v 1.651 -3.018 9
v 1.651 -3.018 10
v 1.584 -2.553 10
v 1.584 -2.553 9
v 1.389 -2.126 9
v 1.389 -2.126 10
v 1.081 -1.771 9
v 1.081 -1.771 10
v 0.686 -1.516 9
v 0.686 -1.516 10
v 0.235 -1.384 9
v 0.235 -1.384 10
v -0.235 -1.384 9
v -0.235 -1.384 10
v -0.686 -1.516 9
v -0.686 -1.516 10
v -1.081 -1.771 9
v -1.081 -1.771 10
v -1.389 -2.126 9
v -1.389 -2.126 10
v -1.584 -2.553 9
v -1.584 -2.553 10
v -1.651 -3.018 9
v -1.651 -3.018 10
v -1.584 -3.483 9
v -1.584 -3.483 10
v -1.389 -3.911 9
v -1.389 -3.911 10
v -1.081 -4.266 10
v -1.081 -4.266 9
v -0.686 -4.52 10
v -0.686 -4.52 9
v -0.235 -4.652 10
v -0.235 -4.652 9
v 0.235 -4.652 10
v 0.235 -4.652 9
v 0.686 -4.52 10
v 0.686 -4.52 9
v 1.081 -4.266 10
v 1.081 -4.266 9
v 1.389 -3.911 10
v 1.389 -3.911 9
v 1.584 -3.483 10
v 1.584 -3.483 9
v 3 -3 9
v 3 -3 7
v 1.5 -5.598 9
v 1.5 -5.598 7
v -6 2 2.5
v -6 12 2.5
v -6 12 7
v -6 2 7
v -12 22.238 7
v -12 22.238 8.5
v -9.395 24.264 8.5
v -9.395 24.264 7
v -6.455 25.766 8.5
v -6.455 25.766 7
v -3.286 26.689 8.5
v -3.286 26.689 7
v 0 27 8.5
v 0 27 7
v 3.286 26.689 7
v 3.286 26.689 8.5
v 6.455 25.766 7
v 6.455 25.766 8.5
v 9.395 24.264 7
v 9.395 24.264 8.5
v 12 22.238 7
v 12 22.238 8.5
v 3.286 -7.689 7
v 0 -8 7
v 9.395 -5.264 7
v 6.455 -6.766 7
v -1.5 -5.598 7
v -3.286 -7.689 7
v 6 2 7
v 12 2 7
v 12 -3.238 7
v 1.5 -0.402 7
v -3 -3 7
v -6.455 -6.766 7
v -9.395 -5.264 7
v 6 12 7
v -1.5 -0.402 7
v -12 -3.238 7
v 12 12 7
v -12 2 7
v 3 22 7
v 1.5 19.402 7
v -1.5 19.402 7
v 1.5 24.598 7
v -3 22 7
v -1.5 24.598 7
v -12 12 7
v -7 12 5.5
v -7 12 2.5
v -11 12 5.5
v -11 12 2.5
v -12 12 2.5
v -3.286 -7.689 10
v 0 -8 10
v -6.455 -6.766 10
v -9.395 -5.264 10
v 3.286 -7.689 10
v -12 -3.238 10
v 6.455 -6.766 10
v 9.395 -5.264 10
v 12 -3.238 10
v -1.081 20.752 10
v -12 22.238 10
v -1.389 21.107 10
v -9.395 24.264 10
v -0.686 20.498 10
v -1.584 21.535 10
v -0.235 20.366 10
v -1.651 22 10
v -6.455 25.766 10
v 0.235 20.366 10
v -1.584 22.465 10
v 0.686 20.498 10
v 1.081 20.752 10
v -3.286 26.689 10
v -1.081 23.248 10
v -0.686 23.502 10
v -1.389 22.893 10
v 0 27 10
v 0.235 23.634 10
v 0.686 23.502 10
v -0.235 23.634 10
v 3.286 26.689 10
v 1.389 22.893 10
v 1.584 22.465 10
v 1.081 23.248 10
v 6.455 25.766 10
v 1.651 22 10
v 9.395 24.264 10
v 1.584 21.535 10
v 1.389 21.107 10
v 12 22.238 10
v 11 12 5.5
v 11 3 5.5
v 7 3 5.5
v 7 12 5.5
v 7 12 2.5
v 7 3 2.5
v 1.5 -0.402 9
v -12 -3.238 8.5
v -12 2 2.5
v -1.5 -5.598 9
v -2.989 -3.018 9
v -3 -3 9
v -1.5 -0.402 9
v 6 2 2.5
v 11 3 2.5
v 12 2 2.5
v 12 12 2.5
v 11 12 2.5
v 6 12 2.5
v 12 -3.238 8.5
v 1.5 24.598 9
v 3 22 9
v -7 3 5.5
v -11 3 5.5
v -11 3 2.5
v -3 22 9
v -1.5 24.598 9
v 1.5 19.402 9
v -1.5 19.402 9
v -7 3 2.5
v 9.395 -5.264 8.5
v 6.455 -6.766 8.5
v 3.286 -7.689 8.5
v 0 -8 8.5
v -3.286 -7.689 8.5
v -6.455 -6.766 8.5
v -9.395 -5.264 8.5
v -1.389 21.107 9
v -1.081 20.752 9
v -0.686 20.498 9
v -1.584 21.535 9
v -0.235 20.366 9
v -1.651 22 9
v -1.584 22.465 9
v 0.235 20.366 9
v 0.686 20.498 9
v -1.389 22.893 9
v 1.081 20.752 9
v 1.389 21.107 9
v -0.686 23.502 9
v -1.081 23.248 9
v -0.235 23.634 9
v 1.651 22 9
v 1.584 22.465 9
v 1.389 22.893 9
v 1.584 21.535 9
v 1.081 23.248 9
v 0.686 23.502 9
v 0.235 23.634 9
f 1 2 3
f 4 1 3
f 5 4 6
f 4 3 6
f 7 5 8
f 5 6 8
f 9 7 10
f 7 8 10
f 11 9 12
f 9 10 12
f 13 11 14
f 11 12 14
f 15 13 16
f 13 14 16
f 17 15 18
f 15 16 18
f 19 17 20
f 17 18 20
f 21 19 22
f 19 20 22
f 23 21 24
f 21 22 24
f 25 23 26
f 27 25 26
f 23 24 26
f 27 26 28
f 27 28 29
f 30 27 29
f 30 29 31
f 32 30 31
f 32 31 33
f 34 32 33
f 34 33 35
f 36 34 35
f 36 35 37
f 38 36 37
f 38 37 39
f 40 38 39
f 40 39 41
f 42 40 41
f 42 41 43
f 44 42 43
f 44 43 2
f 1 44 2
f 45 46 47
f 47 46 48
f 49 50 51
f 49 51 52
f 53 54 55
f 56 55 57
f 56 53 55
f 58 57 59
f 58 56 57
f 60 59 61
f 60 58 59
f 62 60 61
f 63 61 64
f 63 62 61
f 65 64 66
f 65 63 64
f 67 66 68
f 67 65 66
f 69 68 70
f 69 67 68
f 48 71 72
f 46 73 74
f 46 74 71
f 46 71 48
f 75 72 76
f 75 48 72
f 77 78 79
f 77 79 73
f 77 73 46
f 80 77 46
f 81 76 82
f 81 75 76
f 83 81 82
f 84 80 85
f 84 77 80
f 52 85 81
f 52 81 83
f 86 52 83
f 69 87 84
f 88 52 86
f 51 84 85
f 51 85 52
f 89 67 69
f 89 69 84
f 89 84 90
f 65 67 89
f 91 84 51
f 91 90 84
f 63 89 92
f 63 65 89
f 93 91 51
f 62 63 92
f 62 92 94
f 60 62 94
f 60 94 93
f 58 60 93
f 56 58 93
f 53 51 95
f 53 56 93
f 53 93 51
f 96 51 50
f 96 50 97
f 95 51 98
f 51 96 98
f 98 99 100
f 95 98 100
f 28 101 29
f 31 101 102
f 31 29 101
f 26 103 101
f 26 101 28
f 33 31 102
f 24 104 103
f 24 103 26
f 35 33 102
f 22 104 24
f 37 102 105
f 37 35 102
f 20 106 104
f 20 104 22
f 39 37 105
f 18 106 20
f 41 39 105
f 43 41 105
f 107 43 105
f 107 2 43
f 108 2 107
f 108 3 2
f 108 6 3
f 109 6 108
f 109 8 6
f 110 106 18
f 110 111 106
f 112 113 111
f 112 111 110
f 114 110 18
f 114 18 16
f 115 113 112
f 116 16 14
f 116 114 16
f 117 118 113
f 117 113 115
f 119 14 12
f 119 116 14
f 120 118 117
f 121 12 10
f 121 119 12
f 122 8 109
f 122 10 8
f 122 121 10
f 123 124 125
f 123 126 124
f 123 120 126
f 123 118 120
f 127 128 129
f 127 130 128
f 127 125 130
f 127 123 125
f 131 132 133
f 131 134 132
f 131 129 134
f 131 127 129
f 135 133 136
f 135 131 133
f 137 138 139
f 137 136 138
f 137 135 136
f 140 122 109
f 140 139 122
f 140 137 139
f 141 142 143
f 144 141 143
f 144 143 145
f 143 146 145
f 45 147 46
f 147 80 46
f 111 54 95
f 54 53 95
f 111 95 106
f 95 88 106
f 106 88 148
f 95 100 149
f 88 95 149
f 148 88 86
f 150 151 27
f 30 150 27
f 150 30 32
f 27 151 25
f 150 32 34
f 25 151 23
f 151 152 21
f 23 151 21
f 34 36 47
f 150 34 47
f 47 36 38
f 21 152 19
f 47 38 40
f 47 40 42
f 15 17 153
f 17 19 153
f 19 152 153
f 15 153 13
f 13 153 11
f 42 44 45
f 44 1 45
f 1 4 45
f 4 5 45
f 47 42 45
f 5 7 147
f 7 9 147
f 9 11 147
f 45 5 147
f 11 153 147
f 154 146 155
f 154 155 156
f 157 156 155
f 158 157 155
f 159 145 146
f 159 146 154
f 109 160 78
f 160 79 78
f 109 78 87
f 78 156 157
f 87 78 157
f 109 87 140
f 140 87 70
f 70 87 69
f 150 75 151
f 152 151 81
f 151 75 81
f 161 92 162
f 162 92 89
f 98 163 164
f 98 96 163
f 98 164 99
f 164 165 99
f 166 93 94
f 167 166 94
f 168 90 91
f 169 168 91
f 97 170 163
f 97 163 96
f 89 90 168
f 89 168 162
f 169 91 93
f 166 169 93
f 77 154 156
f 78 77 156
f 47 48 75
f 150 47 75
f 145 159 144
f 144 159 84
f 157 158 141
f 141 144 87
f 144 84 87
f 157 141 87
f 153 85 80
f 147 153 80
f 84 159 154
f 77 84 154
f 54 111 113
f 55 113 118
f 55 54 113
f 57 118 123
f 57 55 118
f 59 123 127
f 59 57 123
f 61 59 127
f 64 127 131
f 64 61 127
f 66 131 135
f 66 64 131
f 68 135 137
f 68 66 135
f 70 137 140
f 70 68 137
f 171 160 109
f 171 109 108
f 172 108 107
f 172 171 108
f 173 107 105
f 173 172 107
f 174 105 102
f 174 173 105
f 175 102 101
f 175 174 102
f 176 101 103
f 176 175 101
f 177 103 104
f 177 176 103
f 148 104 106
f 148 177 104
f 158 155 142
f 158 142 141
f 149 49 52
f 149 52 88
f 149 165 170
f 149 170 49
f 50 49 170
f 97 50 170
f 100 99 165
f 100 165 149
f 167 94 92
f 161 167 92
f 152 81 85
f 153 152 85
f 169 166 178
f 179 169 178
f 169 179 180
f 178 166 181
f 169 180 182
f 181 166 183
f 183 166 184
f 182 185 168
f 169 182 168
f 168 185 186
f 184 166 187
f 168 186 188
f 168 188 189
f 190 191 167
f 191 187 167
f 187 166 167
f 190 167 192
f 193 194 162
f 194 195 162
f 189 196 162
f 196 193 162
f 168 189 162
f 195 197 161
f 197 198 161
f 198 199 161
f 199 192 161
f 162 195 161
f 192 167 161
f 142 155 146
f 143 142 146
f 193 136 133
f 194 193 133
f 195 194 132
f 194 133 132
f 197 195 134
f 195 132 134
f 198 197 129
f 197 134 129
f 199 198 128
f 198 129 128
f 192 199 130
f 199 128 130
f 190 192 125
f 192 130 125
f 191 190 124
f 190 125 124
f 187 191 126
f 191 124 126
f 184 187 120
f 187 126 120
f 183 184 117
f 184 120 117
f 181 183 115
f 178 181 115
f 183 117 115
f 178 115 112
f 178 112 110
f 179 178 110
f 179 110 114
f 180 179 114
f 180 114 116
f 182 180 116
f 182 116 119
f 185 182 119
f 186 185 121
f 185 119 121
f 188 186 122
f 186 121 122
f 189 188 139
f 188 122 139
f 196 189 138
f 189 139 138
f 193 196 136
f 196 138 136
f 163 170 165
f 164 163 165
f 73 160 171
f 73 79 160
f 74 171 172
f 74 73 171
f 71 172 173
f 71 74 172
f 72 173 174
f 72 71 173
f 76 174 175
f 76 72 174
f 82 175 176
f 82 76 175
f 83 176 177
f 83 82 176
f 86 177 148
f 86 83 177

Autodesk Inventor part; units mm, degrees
ref_plane "YZ Plane" through (0, 0, 0) normal (1, 0, 0) x (0, 1, 0)
ref_plane "XZ Plane" through (0, 0, 0) normal (0, 1, 0) x (-1, 0, 0)
ref_plane "XY Plane" through (0, 0, 0) normal (0, 0, 1) x (1, 0, 0)
sketch "Sketch1" plane through (0, 0, 0) normal (0, 0, 1) x (1, 0, 0)
  line L0 (0, 0) -> (4, 0)
  line L1 (4, 0) -> (4, 13)
  line L2 (4, 13) -> (0, 13)
  line L3 (0, 13) -> (0, 0)
  line L4 (4, 13) -> (-4, 13)
  line L5 (-4, 13) -> (-4, -8)
  line L6 (-4, -8) -> (4, -8)
  line L7 (4, -8) -> (4, 13)
  line L8 (-4, 13) -> (4, 13)
  line L9 (4, 13) -> (4, 21)
  line L10 (4, 21) -> (-4, 21)
  line L11 (-4, 21) -> (-4, 13)
  line L12 (4, 21) -> (7, 21)
  line L13 (7, 21) -> (7, 13)
  line L14 (7, 13) -> (4, 13)
  line L15 (4, 13) -> (4, 21)
  line L16 (7, 21) -> (11, 21)
  line L17 (11, 21) -> (11, 13)
  line L18 (11, 13) -> (7, 13)
  line L19 (7, 13) -> (7, 21)
  line L20 (11, 13) -> (4, 13)
  line L21 (4, 13) -> (4, -8)
  line L22 (4, -8) -> (11, -8)
  line L23 (4, -8) -> (11, -8)
  line L24 (11, -8) -> (11, 0)
  line L25 (11, 0) -> (4, 0)
  line L26 (4, 0) -> (4, -8)
  line L27 (11, -8) -> (14, -8)
  line L28 (14, -8) -> (14, 0)
  line L29 (14, 0) -> (11, 0)
  line L30 (11, 0) -> (11, -8)
  line L31 (14, -8) -> (19, -8)
  line L32 (19, -8) -> (19, 13)
  line L33 (19, 13) -> (14, 13)
  line L34 (14, 13) -> (14, -8)
  line L35 (14, 13) -> (22, 13)
  line L36 (14, 18) -> (14, 13)
  line L37 (19, 13) -> (14, 13)
  line L38 (14, 13) -> (14, 21)
  line L39 (14, 21) -> (19, 21)
  line L40 (19, 21) -> (19, 13)
  line L41 (19, -8) -> (-19, -8)
  line L42 (-19, -8) -> (-19, 0)
  line L43 (-19, 0) -> (19, 0)
  line L44 (19, 0) -> (19, -8)
  line L45 (-4, 0) -> (-7, 0)
  line L46 (-7, 0) -> (-7, -8)
  line L47 (-7, -8) -> (-4, -8)
  line L48 (-4, -8) -> (-4, 0)
  line L49 (-7, 0) -> (-11, 0)
  line L50 (-11, 0) -> (-11, -8)
  line L51 (-11, -8) -> (-7, -8)
  line L52 (-7, -8) -> (-7, 0)
  line L53 (-11, -8) -> (-14, -8)
  line L54 (-14, -8) -> (-14, 0)
  line L55 (-14, 0) -> (-11, 0)
  line L56 (-11, 0) -> (-11, -8)
  line L57 (7, 13) -> (11, 13)
  line L58 (11, 13) -> (11, 3)
  line L59 (11, 3) -> (7, 3)
  line L60 (7, 3) -> (7, 13)
  line L61 (-4, 13) -> (-7, 13)
  line L62 (-7, 13) -> (-7, 21)
  line L63 (-7, 21) -> (-4, 21)
  line L64 (-4, 21) -> (-4, 13)
  line L65 (-7, 21) -> (-11, 21)
  line L66 (-11, 21) -> (-11, 13)
  line L67 (-11, 13) -> (-7, 13)
  line L68 (-7, 13) -> (-7, 21)
  line L69 (-7, 13) -> (-11, 13)
  line L70 (-11, 13) -> (-11, 3)
  line L71 (-11, 3) -> (-7, 3)
  line L72 (-7, 3) -> (-7, 13)
  line L73 (-19, -8) -> (-14, -8)
  line L74 (-14, -8) -> (-14, 13)
  line L75 (-14, 13) -> (-19, 13)
  line L76 (-19, 13) -> (-19, -8)
  dimension "d0" = 4
  dimension "d1" = 13
  dimension "d2" = 8
  dimension "d3" = 21
  dimension "d4" = 8
  dimension "d5" = 8
  dimension "d6" = 3
  dimension "d7" = 8
  dimension "d8" = 4
  dimension "d9" = 8
  dimension "d10" = 3
  dimension "d11" = 8
  dimension "d12" = 5
  dimension "d13" = 21
  dimension "d16" = 5
  dimension "d17" = 8
  dimension "d18" = 38
  dimension "d19" = 8
  dimension "d20" = 3
  dimension "d21" = 8
  dimension "d22" = 4
  dimension "d23" = 8
  dimension "d24" = 3
  dimension "d25" = 8
  dimension "d26" = 10
  dimension "d27" = 3
  dimension "d28" = 8
  dimension "d29" = 4
  dimension "d30" = 8
  dimension "d31" = 4
  dimension "d32" = 10
  dimension "d33" = 5
  dimension "d34" = 21
extrude "Extrusion1" add sketch "Sketch1" along normal blind 2.5 contours L3 L2 L1 L0 | L43 L5 L4 L3 | L0 L7 L6 L5 L43 | L25 L24 L22 L7 | L4 L11 L10 L9 L2 | L5 L41 L46 L43 | L9 L12 L13 L14 | L29 L28 L27 L24 | L61 L62 L63 L11 | L46 L41 L50 L43 | L13 L16 L17 L18 | L18 L58 L59 L60 | L43 L32 L31 L28 | L34 L33 L32 L43 | L67 L66 L65 L62 | L72 L71 L70 L67 | L50 L41 L54 L43 | L54 L41 L42 L43 | L43 L76 L75 L74
sketch "Sketch2" plane through (0, 0, 2.5) normal (0, 0, 1) x (1, 0, 0)
  line L0 (-14, 13) -> (-19, 13) projected
  line L1 (-19, 13) -> (-14, 13)
  line L2 (-14, 13) -> (-14, 8)
  line L3 (-14, 8) -> (-19, 8)
  line L4 (-19, 8) -> (-19, 13)
  line L5 (14, 13) -> (19, 13)
  line L6 (19, 13) -> (19, 8)
  line L7 (19, 8) -> (14, 8)
  line L8 (14, 8) -> (14, 13)
  line L9 (-20.5, 6.5) -> (-12.5, 6.5)
  line L10 (-12.5, 6.5) -> (-12.5, 14.5)
  line L11 (-12.5, 14.5) -> (-20.5, 14.5)
  line L12 (-20.5, 14.5) -> (-20.5, 6.5)
  line L13 (12.5, 6.5) -> (20.5, 6.5)
  line L14 (20.5, 6.5) -> (20.5, 14.5)
  line L15 (20.5, 14.5) -> (12.5, 14.5)
  line L16 (12.5, 14.5) -> (12.5, 6.5)
  line L17 (-20.5, 14.5) -> (-19, 14.5)
  line L18 (-19, 14.5) -> (-19, 4.5)
  line L19 (-19, 4.5) -> (-20.5, 4.5)
  line L20 (-20.5, 4.5) -> (-20.5, 14.5)
  line L21 (-14, 0) -> (-14, 13) projected
  line L22 (-12.5, 14.5) -> (-14, 14.5)
  line L23 (-14, 14.5) -> (-14, 4.5)
  line L24 (-14, 4.5) -> (-12.5, 4.5)
  line L25 (-12.5, 4.5) -> (-12.5, 14.5)
  line L26 (-19, 14.5) -> (-14, 14.5)
  line L27 (-14, 14.5) -> (-14, 13)
  line L28 (-14, 13) -> (-19, 13)
  line L29 (-19, 13) -> (-19, 14.5)
  line L30 (12.5, 14.5) -> (20.5, 14.5)
  line L31 (20.5, 14.5) -> (20.5, 13)
  line L32 (20.5, 13) -> (12.5, 13)
  line L33 (12.5, 13) -> (12.5, 14.5)
  line L34 (14, 13) -> (14, 0) projected
  line L35 (12.5, 14.5) -> (14, 14.5)
  line L36 (14, 14.5) -> (14, 4.5)
  line L37 (14, 4.5) -> (12.5, 4.5)
  line L38 (12.5, 4.5) -> (12.5, 14.5)
  line L39 (19, -8) -> (19, 13) projected
  line L40 (20.5, 14.5) -> (19, 14.5)
  line L41 (19, 14.5) -> (19, 4.5)
  line L42 (19, 4.5) -> (20.5, 4.5)
  line L43 (20.5, 4.5) -> (20.5, 14.5)
  point P0 (0, 0)
  dimension "d37" = 5
  dimension "d38" = 5
  dimension "d39" = 5
  dimension "d40" = 5
  dimension "d41" = 1.5
  dimension "d42" = 1.5
  dimension "d43" = 1.5
  dimension "d44" = 10
  dimension "d45" = 10
  dimension "d46" = 10
extrude "Extrusion2" add sketch "Sketch2" along normal blind 3 contours L23 L11 L10 L9 L21 L2 | L0 L18 L11 L23 | L4 L18 L9 L12 L11 | L9 L25 L24 L21 | L18 L19 L20 L9 | L36 L15 L41 L5 | L8 L34 L13 L16 L32 | L32 L16 L15 L36 | L32 L14 L13 L39 L6 | L41 L15 L14 L32 | L34 L37 L38 L13 | L13 L43 L42 L39
sketch "Sketch4" plane through (0, 0, 5.5) normal (0, 0, 1) x (1, 0, 0)
  line L0 (-12.5, 14.5) -> (-20.5, 14.5) projected
  line L1 (-12.5, 4.5) -> (-12.5, 14.5) projected
  line L2 (-20.5, 14.5) -> (-12.5, 14.5)
  line L3 (-12.5, 14.5) -> (-12.5, 4.5)
  line L4 (-12.5, 4.5) -> (-20.5, 4.5)
  line L5 (-20.5, 4.5) -> (-20.5, 14.5)
  line L6 (12.5, 14.5) -> (12.5, 4.5) projected
  line L7 (20.5, 4.5) -> (20.5, 14.5) projected
  line L8 (12.5, 14.5) -> (20.5, 14.5)
  line L9 (20.5, 14.5) -> (20.5, 4.5)
  line L10 (20.5, 4.5) -> (12.5, 4.5)
  line L11 (12.5, 4.5) -> (12.5, 14.5)
  point P0 (0, 0)
extrude "Extrusion3" add sketch "Sketch4" along normal blind 1.5
sketch "Sketch5" plane through (0, 0, 7) normal (0, 0, 1) x (1, 0, 0)
  line L0 (-12.5, 14.5) -> (-20.5, 14.5) projected
  line L1 (20.5, 4.5) -> (20.5, 14.5) projected
  line L2 (-20.5, 14.5) -> (20.5, 14.5)
  line L3 (20.5, 14.5) -> (20.5, 4.5)
  line L4 (20.5, 4.5) -> (-20.5, 4.5)
  line L5 (-20.5, 4.5) -> (-20.5, 14.5)
  line L6 (-20.5, 14.5) -> (-20.5, 4.5) projected
  line L7 (-20.5, 9.5) -> (20.5, 9.5)
  line L8 (0, 9.5) -> (0, 14.5)
  circle A0 centre (0, 9.5) radius 17.5
  point P0 (0, 0)
extrude "Extrusion4" add sketch "Sketch5" along normal blind 1.5
sketch "Sketch6" plane through (0, 0, 8.5) normal (0, 0, 1) x (1, 0, 0)
  arc A0 (16.7705, 14.5) -> (-16.7705, 14.5) centre (0, 9.5) ccw projected
  circle A1 centre (0, 9.5) radius 17.5
  circle A2 centre (0, 9.5) radius 7.5
  circle A3 centre (0, 9.5) radius 12.5
  line L0 (12.5, 14.5) -> (12.5, 4.5) projected
  circle A4 centre (0, 9.5) radius 10
  circle A5 centre (0, -0.5) radius 1.651
  circle A6 centre (0, 2) radius 1.651
  circle A7 centre (7.5, 9.5) radius 1.651
  circle A8 centre (-7.5, 9.5) radius 1.651
  circle A9 centre (0, 17) radius 1.651
  circle A10 centre (0, 22) radius 1.651
  circle A11 centre (0, -3) radius 1.651
  point P0 (0, 0)
  dimension "d54" = 20
  dimension "d53" = 15
  dimension "d55" = 3.302
  dimension "d56" = 3.302
  dimension "d57" = 3.302
  dimension "d58" = 3.302
  dimension "d59" = 3.302
  dimension "d62" = 3.302
  dimension "d63" = 3.302
extrude "Extrusion5" cut sketch "Sketch6" against normal blind 2.5 contours A2 A7 | A2 A7 | A8 A2 | A2 A8 | A11 A5 | A5 A11 A3 | A3 A11 | A10 A3 | A3 A10
sketch "Sketch7" plane through (0, 0, 2.5) normal (0, 0, -1) x (-1, 0, 0)
  line L0 (-36.0395, -19.2499) -> (42.4279, -19.2499)
  line L1 (42.4279, -19.2499) -> (42.4279, 35.743)
  line L2 (42.4279, 35.743) -> (-36.0395, 35.743)
  line L3 (-36.0395, 35.743) -> (-36.0395, -19.2499)
  point P0 (0, 0)
extrude "Extrusion6" cut sketch "Sketch7" along normal blind 2.5
sketch "Sketch8" plane through (0, 0, 2.5) normal (0, 0, -1) x (-1, 0, 0)
  line L0 (-12.5, 14.5) -> (-12.5, 4.5) projected
  line L1 (-12.5, 14.5) -> (-13, 14.5)
  line L2 (-13, 14.5) -> (-13, 4.5)
  line L3 (-13, 4.5) -> (-12.5, 4.5)
  line L4 (-12.5, 4.5) -> (-12.5, 14.5)
  line L5 (12.5, 4.5) -> (12.5, 14.5) projected
  line L6 (12.5, 14.5) -> (13, 14.5)
  line L7 (13, 14.5) -> (13, 4.5)
  line L8 (13, 4.5) -> (12.5, 4.5)
  line L9 (12.5, 4.5) -> (12.5, 14.5)
  point P0 (0, 0)
  dimension "d66" = 0.5
  dimension "d67" = 10
  dimension "d68" = 0.5
  dimension "d69" = 10
extrude "Extrusion7" cut sketch "Sketch8" against normal blind 4.5
sketch "Sketch10" plane through (0, 0, 2.5) normal (0, 0, -1) x (-1, 0, 0)
  line L0 (19, 13) -> (19, 4.5) projected
  line L1 (19, 13) -> (14, 13)
  line L2 (14, 13) -> (14, -8)
  line L3 (14, -8) -> (19, -8)
  line L4 (19, -8) -> (19, 13)
  line L5 (14, -8) -> (11, -8)
  line L6 (11, -8) -> (11, 0)
  line L7 (11, 0) -> (14, 0)
  line L8 (14, 0) -> (14, -8)
  line L9 (11, -8) -> (7, -8)
  line L10 (7, -8) -> (7, 0)
  line L11 (7, 0) -> (11, 0)
  line L12 (11, 0) -> (11, -8)
  line L13 (7, -8) -> (4, -8)
  line L14 (4, -8) -> (4, 0)
  line L15 (4, 0) -> (7, 0)
  line L16 (7, 0) -> (7, -8)
  line L17 (4, -8) -> (0, -8)
  line L18 (0, -8) -> (0, 0)
  line L19 (0, 0) -> (4, 0)
  line L20 (4, 0) -> (4, -8)
  line L21 (0, 0) -> (-4, 0)
  line L22 (-4, 0) -> (-4, -8)
  line L23 (-4, -8) -> (0, -8)
  line L24 (0, -8) -> (0, 0)
  line L25 (-4, -8) -> (-7, -8)
  line L26 (-7, -8) -> (-7, 0)
  line L27 (-7, 0) -> (-4, 0)
  line L28 (-4, 0) -> (-4, -8)
  line L29 (-7, -8) -> (-11, -8)
  line L30 (-11, -8) -> (-11, 0)
  line L31 (-11, 0) -> (-7, 0)
  line L32 (-7, 0) -> (-7, -8)
  line L33 (-11, -8) -> (-14, -8)
  line L34 (-14, -8) -> (-14, 0)
  line L35 (-14, 0) -> (-11, 0)
  line L36 (-11, 0) -> (-11, -8)
  line L37 (-14, -8) -> (-19, -8)
  line L38 (-19, -8) -> (-19, 13)
  line L39 (-19, 13) -> (-14, 13)
  line L40 (-14, 13) -> (-14, -8)
  line L41 (4, -8) -> (-4, -8)
  line L42 (-4, -8) -> (-4, 21)
  line L43 (-4, 21) -> (4, 21)
  line L44 (4, 21) -> (4, -8)
  line L45 (4, 21) -> (7, 21)
  line L46 (7, 21) -> (7, 13)
  line L47 (7, 13) -> (4, 13)
  line L48 (4, 13) -> (4, 21)
  line L49 (-4, 21) -> (-7, 21)
  line L50 (-7, 21) -> (-7, 13)
  line L51 (-7, 13) -> (-4, 13)
  line L52 (-4, 13) -> (-4, 21)
  line L53 (4, 0) -> (14, 0)
  line L54 (14, 0) -> (14, 3)
  line L55 (14, 3) -> (4, 3)
  line L56 (4, 3) -> (4, 0)
  line L57 (7, 13) -> (4, 13)
  line L58 (4, 13) -> (4, 3)
  line L59 (4, 3) -> (7, 3)
  line L60 (7, 3) -> (7, 13)
  line L61 (7, 3) -> (12, 3)
  line L62 (12, 3) -> (12, 13)
  line L63 (12, 13) -> (7, 13)
  line L64 (7, 13) -> (7, 3)
  line L65 (12, 13) -> (7, 13)
  line L66 (7, 13) -> (7, 21)
  line L67 (7, 21) -> (12, 21)
  line L68 (12, 21) -> (12, 13)
  line L69 (7, 3) -> (11, 3)
  line L70 (11, 3) -> (11, 21)
  line L71 (11, 21) -> (7, 21)
  line L72 (7, 21) -> (7, 3)
  line L73 (-7, 21) -> (-11, 21)
  line L74 (-11, 21) -> (-11, 8)
  line L75 (-11, 8) -> (-7, 8)
  line L76 (-7, 8) -> (-7, 21)
  line L77 (-11, 8) -> (-7, 8)
  line L78 (-7, 8) -> (-7, 3)
  line L79 (-7, 3) -> (-11, 3)
  line L80 (-11, 3) -> (-11, 8)
  dimension "d72" = 5
  dimension "d73" = 21
  dimension "d74" = 3
  dimension "d75" = 8
  dimension "d76" = 4
  dimension "d77" = 8
  dimension "d78" = 3
  dimension "d79" = 8
  dimension "d80" = 4
  dimension "d81" = 3
  dimension "d82" = 8
  dimension "d83" = 4
  dimension "d84" = 8
  dimension "d85" = 3
  dimension "d86" = 8
  dimension "d87" = 5
  dimension "d88" = 21
  dimension "d89" = 8
  dimension "d90" = 29
  dimension "d91" = 3
  dimension "d92" = 8
  dimension "d93" = 3
  dimension "d94" = 5
  dimension "d95" = 10
  dimension "d96" = 4
  dimension "d97" = 4
  dimension "d98" = 13
  dimension "d99" = 5
extrude "Extrusion8" add sketch "Sketch10" along normal blind 2.5 contours L55 L70 L63 L62 | L55 L60 L63 L70 | L78 L79 L80 L75
sketch "Sketch12" plane through (0, 0, 2.5) normal (0, 0, -1) x (-1, 0, 0)
  line L0 (-20.5, 14.5) -> (-16.7705, 14.5) projected
  line L1 (-13, 4.5) -> (-14, 4.5) projected
  line L2 (-13, 4.5) -> (-20.5, 4.5)
  line L3 (-20.5, 4.5) -> (-20.5, 14.5)
  line L4 (-20.5, 14.5) -> (-20.5, 4.5)
  line L5 (-20.5, 4.5) -> (-20.5, 14.5) projected
  line L6 (-20.5, 14.5) -> (-20.5, 4.5)
  line L7 (-11, 3) -> (-7, 3) projected
  line L8 (-11, 3) -> (-7, 3)
  line L9 (7, 3) -> (12, 3) projected
  line L10 (7, 3) -> (11, 3)
  line L11 (-6, 2) -> (-12, 2)
  line L12 (6, 2) -> (12, 2)
  line L13 (-11, 3) -> (-12, 3)
  line L14 (-12, 2) -> (-11, 2)
  line L15 (-11, 2) -> (-11, 12)
  line L16 (-11, 12) -> (-12, 12)
  line L17 (-12, 12) -> (-12, 2)
  line L18 (-6, 2) -> (-7, 2)
  line L19 (-7, 2) -> (-7, 12)
  line L20 (-7, 12) -> (-6, 12)
  line L21 (-6, 12) -> (-6, 2)
  line L22 (-11, 3) -> (-7, 3)
  line L23 (-7, 3) -> (-7, 2)
  line L24 (-7, 2) -> (-11, 2)
  line L25 (-11, 2) -> (-11, 3)
  line L26 (6, 2) -> (7, 2)
  line L27 (7, 2) -> (7, 12)
  line L28 (7, 12) -> (6, 12)
  line L29 (6, 12) -> (6, 2)
  line L30 (12, 2) -> (11, 2)
  line L31 (11, 2) -> (11, 12)
  line L32 (11, 12) -> (12, 12)
  line L33 (12, 12) -> (12, 2)
  line L34 (11, 2) -> (7, 2)
  line L35 (7, 2) -> (7, 3)
  line L36 (7, 3) -> (11, 3)
  line L37 (11, 3) -> (11, 2)
  point P0 (0, 0)
  dimension "d102" = 10
  dimension "d108" = 10
  dimension "d109" = 10
  dimension "d110" = 10
  dimension "d111" = 10
extrude "Extrusion9" add sketch "Sketch12" against normal blind 4.5
sketch "Sketch13" plane through (0, 0, 2.5) normal (0, 0, -1) x (-1, 0, 0)
  line L0 (-38.1757, -13.5793) -> (29.0802, -13.5793)
  line L1 (29.0802, -13.5793) -> (29.0802, 23.5075)
  line L2 (29.0802, 23.5075) -> (-38.1757, 23.5075)
  line L3 (-38.1757, 23.5075) -> (-38.1757, -13.5793)
  point P0 (0, 0)
extrude "Extrusion10" cut sketch "Sketch13" along normal blind 4.5
sketch "Sketch15" plane through (0, 0, 7) normal (0, 0, -1) x (-1, 0, 0)
  line L0 (-11, 12) -> (-11, 3) projected
  line L1 (-7, 12) -> (-6, 12) projected
  line L2 (-11, 3) -> (-7, 3)
  line L3 (-7, 3) -> (-7, 12)
  line L4 (-7, 12) -> (-11, 12)
  line L5 (-11, 12) -> (-11, 3)
  line L6 (7, 7.9265) -> (7, 3) projected
  line L7 (11, 12) -> (11, 3) projected
  line L8 (7, 3) -> (11, 3)
  line L9 (11, 3) -> (11, 12)
  line L10 (11, 12) -> (7, 12)
  line L11 (7, 12) -> (7, 3)
  point P0 (0, 0)
extrude "Extrusion11" add sketch "Sketch15" along normal blind 1.5
sketch "Sketch16" plane through (0, 0, 7) normal (0, 0, -1) x (-1, 0, 0)
  line L0 (-12.4141, 17.8254) -> (-32.5951, 17.8254)
  line L1 (-32.5951, 17.8254) -> (-32.5951, -1.1459)
  line L2 (-32.5951, -1.1459) -> (-12.4141, -1.1459)
  line L3 (-12.4141, -1.1459) -> (-12.4141, 17.8254)
  line L4 (12.4778, 16.3612) -> (30.5579, 16.3612)
  line L5 (30.5579, 16.3612) -> (30.5579, -3.4378)
  line L6 (30.5579, -3.4378) -> (12.4778, -3.4378)
  line L7 (12.4778, -3.4378) -> (12.4778, 16.3612)
  point P0 (0, 0)
extrude "Extrusion12" cut sketch "Sketch16" along normal blind 10
sketch "Sketch17" plane through (0, 0, 7) normal (0, 0, -1) x (-1, 0, 0)
  arc A0 (16.7705, 14.5) -> (-16.7705, 14.5) centre (0, 9.5) ccw projected
  circle A1 centre (0, 9.5) radius 17.5
  circle A2 centre (0, 9.5) radius 24.0818
  point P0 (0, 0)
extrude "Extrusion13" cut sketch "Sketch17" against normal blind 10
sketch "Sketch18" plane through (0, 9.5, 8.5) normal (0, 0, 1) x (1, 0, 0)
  line L0 (12.6688, -5.8076) -> (-12.9871, -5.8076)
  line L1 (-12.9871, -5.8076) -> (-12.9871, 4.3147)
  line L2 (-12.9871, 4.3147) -> (12.6688, 4.3147)
  line L3 (12.6688, 4.3147) -> (12.6688, -5.8076)
  point P0 (0, -9.5)
extrude "Extrusion14" add sketch "Sketch18" against normal blind 1.5
sketch "Sketch19" plane through (0, 9.5, 7) normal (0, 0, -1) x (-1, 0, 0)
  line L0 (-12, -7.5) -> (-12, 2.5) projected
  line L1 (-12, -2.5) -> (-30.6852, -2.5)
  line L2 (-30.6852, -2.5) -> (-30.6852, 13.7367)
  line L3 (-30.6852, 13.7367) -> (-12, 13.7367)
  line L4 (-12, 13.7367) -> (-12, -2.5)
  line L5 (12, 2.5) -> (12, -7.5) projected
  line L6 (12, -2.5) -> (23.555, -2.5)
  line L7 (23.555, -2.5) -> (23.555, -20.9592)
  line L8 (23.555, -20.9592) -> (12, -20.9592)
  line L9 (12, -20.9592) -> (12, -2.5)
  line L10 (-12, 13.7367) -> (-34.1229, 13.7367)
  line L11 (-34.1229, 13.7367) -> (-34.1229, -29.7446)
  line L12 (-34.1229, -29.7446) -> (-12, -29.7446)
  line L13 (-12, -29.7446) -> (-12, 13.7367)
  line L14 (12, -17.0758) -> (29.03, -17.0758)
  line L15 (29.03, -17.0758) -> (29.03, 15.9012)
  line L16 (29.03, 15.9012) -> (12, 15.9012)
  line L17 (12, 15.9012) -> (12, -17.0758)
  point P0 (0, -9.5)
extrude "Extrusion15" cut sketch "Sketch19" against normal blind 1.5
sketch "Sketch23" plane through (0, 0, 8.5) normal (0, 0, 1) x (1, 0, 0)
  circle A0 centre (0, 22) radius 1.651 projected
  circle A1 centre (0, 22) radius 3
  circle A2 centre (0, -3) radius 1.651 projected
  circle A3 centre (0, -3) radius 3
  line L0 (3, 22) -> (1.5, 19.4019)
  line L1 (1.5, 19.4019) -> (-1.5, 19.4019)
  line L2 (-1.5, 19.4019) -> (-3, 22)
  line L3 (-3, 22) -> (-1.5, 24.5981)
  line L4 (-1.5, 24.5981) -> (1.5, 24.5981)
  line L5 (1.5, 24.5981) -> (3, 22)
  line L6 (3, -3) -> (1.5, -5.5981)
  line L7 (1.5, -5.5981) -> (-1.5, -5.5981)
  line L8 (-1.5, -5.5981) -> (-3, -3)
  line L9 (-3, -3) -> (-1.5, -0.4019)
  line L10 (-1.5, -0.4019) -> (1.5, -0.4019)
  line L11 (1.5, -0.4019) -> (3, -3)
  line L12 (12, -3.2377) -> (12, 22.2377) projected
  line L13 (-12, 22.2377) -> (-12, -3.2377) projected
  arc A4 (12, 22.2377) -> (-12, 22.2377) centre (0, 9.5) ccw
  arc A5 (-12, -3.2377) -> (12, -3.2377) centre (0, 9.5) ccw
  line L14 (12, 22.2377) -> (12, -3.2377)
  arc A6 (12, 22.2377) -> (-12, 22.2377) centre (0, 9.5) ccw projected
  line L15 (-12, 22.2377) -> (-12, -3.2377)
  point P0 (0, 0)
  dimension "d130" = 6
  dimension "d131" = 6
extrude "Extrusion17" add sketch "Sketch23" along normal blind 1.5 contours L5 A1 | A1 L0 | L4 A1 | A1 L1 | L3 A1 | A1 L2 | L11 A3 | A3 L6 | L10 A3 | A3 L7 | L9 A3 | A3 L8 | A5 L13 A4 L12
sketch "Sketch24" plane through (0, 0, 8.5) normal (0, 0, 1) x (1, 0, 0)
  circle A0 centre (0, 22) radius 1.651 projected
  circle A1 centre (0, 22) radius 1.651
  circle A2 centre (0, -3) radius 1.651 projected
  circle A3 centre (0, -3) radius 1.651
  line L0 (1.5, 19.4019) -> (3, 22) projected
  line L1 (3, 22) -> (1.5, 19.4019)
  line L2 (1.5, 19.4019) -> (-1.5, 19.4019)
  line L3 (-1.5, 19.4019) -> (-3, 22)
  line L4 (-3, 22) -> (-1.5, 24.5981)
  line L5 (-1.5, 24.5981) -> (1.5, 24.5981)
  line L6 (1.5, 24.5981) -> (3, 22)
  line L7 (3, -3) -> (1.5, -5.5981)
  line L8 (1.5, -5.5981) -> (-1.5, -5.5981)
  line L9 (-1.5, -5.5981) -> (-3, -3)
  line L10 (-3, -3) -> (-1.5, -0.4019)
  line L11 (-1.5, -0.4019) -> (1.5, -0.4019)
  line L12 (1.5, -0.4019) -> (3, -3)
  point P0 (0, 0)
extrude "Extrusion18" cut sketch "Sketch24" along normal mid plane 100
sketch "Sketch25" plane through (0, 0, 10) normal (0, 0, 1) x (1, 0, 0)
  line L0 (1.5, 19.4019) -> (3, 22) projected
  line L1 (3, 22) -> (-3, 22)
  line L2 (-3, 22) -> (-3, -3.0183)
  line L3 (-3, -3.0183) -> (3, -3.0183)
  circle A0 centre (0, 22) radius 1.651
  circle A1 centre (0, -3.0183) radius 1.651
  line L4 (4.4772, 25.7061) -> (-3.8232, 25.7061)
  line L5 (-3.8232, 25.7061) -> (-3.8232, -6.6403)
  line L6 (-3.8232, -6.6403) -> (4.4772, -6.6403)
  line L7 (4.4772, -6.6403) -> (4.4772, 25.7061)
  point P0 (0, 0)
  dimension "d136" = 3.302
  dimension "d137" = 3.302
extrude "Extrusion19" add sketch "Sketch25" against normal blind 1
properties part number "loadCelMountLower"
